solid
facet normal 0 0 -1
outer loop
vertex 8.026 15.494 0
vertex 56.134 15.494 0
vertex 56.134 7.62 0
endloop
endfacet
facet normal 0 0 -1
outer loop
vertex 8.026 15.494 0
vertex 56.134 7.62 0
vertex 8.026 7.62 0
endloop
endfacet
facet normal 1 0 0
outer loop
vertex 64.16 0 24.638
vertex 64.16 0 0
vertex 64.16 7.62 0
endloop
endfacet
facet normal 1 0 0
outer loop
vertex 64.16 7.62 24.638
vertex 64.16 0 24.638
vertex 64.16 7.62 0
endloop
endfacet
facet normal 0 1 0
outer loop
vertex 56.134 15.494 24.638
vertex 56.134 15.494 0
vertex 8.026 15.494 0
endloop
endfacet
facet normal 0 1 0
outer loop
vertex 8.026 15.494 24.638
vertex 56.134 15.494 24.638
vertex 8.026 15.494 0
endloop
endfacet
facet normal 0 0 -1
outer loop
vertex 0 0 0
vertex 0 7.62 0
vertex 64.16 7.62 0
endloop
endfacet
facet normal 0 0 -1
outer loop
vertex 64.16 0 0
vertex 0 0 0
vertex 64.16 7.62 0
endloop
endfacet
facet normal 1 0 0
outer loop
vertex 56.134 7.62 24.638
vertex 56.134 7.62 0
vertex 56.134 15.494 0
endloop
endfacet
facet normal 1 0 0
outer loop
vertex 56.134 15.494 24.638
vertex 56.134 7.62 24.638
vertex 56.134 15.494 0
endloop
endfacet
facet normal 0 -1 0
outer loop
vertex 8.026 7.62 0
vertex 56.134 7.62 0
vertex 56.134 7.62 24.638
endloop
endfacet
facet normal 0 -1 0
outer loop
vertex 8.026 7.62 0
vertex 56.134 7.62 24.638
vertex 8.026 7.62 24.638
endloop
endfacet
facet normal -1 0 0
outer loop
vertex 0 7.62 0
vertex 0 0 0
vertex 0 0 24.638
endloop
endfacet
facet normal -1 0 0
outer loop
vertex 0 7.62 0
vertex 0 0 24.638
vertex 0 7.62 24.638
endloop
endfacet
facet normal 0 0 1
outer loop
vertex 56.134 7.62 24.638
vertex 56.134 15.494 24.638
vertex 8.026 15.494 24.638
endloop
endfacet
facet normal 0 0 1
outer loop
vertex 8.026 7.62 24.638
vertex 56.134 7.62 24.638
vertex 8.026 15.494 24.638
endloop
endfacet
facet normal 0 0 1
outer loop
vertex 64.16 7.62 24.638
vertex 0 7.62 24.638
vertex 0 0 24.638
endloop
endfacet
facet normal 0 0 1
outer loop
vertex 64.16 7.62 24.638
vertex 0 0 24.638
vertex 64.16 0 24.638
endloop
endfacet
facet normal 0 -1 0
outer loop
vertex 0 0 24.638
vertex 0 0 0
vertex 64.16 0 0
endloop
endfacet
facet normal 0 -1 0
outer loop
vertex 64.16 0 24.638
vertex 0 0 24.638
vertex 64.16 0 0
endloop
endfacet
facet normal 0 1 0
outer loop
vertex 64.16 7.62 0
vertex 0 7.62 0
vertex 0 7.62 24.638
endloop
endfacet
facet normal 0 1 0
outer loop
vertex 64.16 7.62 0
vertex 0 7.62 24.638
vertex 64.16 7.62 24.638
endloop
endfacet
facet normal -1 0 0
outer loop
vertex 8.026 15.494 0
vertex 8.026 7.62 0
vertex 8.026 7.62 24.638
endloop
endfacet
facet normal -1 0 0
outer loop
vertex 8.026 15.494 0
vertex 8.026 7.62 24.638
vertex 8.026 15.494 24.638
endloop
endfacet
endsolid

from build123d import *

# Parameters (mm, degrees)
SKETCH1_W           = 64.1604
SKETCH1_H           = 7.62
BOSS_EXTRUDE1_DEPTH = 24.638
SKETCH2_W           = 48.1076
SKETCH2_H           = 7.874
BOSS_EXTRUDE2_DEPTH = 24.638


with BuildPart() as part:
    # Sketch1 → Boss-Extrude1 (new body)
    with BuildSketch(Plane.XY):
        with Locations((32.0802, 3.81)):
            Rectangle(SKETCH1_W, SKETCH1_H)
    extrude(amount=BOSS_EXTRUDE1_DEPTH)


with BuildPart() as body_2:
    # Sketch2 → Boss-Extrude2 (new body)
    with BuildSketch(Plane(origin=(0, 0, 0), x_dir=(-1, 0, 0), z_dir=(0, 0, -1))):
        with Locations((-32.0802, 11.557)):
            Rectangle(SKETCH2_W, SKETCH2_H)
    extrude(amount=-BOSS_EXTRUDE2_DEPTH)


solid = Compound([part.part, body_2.part])
